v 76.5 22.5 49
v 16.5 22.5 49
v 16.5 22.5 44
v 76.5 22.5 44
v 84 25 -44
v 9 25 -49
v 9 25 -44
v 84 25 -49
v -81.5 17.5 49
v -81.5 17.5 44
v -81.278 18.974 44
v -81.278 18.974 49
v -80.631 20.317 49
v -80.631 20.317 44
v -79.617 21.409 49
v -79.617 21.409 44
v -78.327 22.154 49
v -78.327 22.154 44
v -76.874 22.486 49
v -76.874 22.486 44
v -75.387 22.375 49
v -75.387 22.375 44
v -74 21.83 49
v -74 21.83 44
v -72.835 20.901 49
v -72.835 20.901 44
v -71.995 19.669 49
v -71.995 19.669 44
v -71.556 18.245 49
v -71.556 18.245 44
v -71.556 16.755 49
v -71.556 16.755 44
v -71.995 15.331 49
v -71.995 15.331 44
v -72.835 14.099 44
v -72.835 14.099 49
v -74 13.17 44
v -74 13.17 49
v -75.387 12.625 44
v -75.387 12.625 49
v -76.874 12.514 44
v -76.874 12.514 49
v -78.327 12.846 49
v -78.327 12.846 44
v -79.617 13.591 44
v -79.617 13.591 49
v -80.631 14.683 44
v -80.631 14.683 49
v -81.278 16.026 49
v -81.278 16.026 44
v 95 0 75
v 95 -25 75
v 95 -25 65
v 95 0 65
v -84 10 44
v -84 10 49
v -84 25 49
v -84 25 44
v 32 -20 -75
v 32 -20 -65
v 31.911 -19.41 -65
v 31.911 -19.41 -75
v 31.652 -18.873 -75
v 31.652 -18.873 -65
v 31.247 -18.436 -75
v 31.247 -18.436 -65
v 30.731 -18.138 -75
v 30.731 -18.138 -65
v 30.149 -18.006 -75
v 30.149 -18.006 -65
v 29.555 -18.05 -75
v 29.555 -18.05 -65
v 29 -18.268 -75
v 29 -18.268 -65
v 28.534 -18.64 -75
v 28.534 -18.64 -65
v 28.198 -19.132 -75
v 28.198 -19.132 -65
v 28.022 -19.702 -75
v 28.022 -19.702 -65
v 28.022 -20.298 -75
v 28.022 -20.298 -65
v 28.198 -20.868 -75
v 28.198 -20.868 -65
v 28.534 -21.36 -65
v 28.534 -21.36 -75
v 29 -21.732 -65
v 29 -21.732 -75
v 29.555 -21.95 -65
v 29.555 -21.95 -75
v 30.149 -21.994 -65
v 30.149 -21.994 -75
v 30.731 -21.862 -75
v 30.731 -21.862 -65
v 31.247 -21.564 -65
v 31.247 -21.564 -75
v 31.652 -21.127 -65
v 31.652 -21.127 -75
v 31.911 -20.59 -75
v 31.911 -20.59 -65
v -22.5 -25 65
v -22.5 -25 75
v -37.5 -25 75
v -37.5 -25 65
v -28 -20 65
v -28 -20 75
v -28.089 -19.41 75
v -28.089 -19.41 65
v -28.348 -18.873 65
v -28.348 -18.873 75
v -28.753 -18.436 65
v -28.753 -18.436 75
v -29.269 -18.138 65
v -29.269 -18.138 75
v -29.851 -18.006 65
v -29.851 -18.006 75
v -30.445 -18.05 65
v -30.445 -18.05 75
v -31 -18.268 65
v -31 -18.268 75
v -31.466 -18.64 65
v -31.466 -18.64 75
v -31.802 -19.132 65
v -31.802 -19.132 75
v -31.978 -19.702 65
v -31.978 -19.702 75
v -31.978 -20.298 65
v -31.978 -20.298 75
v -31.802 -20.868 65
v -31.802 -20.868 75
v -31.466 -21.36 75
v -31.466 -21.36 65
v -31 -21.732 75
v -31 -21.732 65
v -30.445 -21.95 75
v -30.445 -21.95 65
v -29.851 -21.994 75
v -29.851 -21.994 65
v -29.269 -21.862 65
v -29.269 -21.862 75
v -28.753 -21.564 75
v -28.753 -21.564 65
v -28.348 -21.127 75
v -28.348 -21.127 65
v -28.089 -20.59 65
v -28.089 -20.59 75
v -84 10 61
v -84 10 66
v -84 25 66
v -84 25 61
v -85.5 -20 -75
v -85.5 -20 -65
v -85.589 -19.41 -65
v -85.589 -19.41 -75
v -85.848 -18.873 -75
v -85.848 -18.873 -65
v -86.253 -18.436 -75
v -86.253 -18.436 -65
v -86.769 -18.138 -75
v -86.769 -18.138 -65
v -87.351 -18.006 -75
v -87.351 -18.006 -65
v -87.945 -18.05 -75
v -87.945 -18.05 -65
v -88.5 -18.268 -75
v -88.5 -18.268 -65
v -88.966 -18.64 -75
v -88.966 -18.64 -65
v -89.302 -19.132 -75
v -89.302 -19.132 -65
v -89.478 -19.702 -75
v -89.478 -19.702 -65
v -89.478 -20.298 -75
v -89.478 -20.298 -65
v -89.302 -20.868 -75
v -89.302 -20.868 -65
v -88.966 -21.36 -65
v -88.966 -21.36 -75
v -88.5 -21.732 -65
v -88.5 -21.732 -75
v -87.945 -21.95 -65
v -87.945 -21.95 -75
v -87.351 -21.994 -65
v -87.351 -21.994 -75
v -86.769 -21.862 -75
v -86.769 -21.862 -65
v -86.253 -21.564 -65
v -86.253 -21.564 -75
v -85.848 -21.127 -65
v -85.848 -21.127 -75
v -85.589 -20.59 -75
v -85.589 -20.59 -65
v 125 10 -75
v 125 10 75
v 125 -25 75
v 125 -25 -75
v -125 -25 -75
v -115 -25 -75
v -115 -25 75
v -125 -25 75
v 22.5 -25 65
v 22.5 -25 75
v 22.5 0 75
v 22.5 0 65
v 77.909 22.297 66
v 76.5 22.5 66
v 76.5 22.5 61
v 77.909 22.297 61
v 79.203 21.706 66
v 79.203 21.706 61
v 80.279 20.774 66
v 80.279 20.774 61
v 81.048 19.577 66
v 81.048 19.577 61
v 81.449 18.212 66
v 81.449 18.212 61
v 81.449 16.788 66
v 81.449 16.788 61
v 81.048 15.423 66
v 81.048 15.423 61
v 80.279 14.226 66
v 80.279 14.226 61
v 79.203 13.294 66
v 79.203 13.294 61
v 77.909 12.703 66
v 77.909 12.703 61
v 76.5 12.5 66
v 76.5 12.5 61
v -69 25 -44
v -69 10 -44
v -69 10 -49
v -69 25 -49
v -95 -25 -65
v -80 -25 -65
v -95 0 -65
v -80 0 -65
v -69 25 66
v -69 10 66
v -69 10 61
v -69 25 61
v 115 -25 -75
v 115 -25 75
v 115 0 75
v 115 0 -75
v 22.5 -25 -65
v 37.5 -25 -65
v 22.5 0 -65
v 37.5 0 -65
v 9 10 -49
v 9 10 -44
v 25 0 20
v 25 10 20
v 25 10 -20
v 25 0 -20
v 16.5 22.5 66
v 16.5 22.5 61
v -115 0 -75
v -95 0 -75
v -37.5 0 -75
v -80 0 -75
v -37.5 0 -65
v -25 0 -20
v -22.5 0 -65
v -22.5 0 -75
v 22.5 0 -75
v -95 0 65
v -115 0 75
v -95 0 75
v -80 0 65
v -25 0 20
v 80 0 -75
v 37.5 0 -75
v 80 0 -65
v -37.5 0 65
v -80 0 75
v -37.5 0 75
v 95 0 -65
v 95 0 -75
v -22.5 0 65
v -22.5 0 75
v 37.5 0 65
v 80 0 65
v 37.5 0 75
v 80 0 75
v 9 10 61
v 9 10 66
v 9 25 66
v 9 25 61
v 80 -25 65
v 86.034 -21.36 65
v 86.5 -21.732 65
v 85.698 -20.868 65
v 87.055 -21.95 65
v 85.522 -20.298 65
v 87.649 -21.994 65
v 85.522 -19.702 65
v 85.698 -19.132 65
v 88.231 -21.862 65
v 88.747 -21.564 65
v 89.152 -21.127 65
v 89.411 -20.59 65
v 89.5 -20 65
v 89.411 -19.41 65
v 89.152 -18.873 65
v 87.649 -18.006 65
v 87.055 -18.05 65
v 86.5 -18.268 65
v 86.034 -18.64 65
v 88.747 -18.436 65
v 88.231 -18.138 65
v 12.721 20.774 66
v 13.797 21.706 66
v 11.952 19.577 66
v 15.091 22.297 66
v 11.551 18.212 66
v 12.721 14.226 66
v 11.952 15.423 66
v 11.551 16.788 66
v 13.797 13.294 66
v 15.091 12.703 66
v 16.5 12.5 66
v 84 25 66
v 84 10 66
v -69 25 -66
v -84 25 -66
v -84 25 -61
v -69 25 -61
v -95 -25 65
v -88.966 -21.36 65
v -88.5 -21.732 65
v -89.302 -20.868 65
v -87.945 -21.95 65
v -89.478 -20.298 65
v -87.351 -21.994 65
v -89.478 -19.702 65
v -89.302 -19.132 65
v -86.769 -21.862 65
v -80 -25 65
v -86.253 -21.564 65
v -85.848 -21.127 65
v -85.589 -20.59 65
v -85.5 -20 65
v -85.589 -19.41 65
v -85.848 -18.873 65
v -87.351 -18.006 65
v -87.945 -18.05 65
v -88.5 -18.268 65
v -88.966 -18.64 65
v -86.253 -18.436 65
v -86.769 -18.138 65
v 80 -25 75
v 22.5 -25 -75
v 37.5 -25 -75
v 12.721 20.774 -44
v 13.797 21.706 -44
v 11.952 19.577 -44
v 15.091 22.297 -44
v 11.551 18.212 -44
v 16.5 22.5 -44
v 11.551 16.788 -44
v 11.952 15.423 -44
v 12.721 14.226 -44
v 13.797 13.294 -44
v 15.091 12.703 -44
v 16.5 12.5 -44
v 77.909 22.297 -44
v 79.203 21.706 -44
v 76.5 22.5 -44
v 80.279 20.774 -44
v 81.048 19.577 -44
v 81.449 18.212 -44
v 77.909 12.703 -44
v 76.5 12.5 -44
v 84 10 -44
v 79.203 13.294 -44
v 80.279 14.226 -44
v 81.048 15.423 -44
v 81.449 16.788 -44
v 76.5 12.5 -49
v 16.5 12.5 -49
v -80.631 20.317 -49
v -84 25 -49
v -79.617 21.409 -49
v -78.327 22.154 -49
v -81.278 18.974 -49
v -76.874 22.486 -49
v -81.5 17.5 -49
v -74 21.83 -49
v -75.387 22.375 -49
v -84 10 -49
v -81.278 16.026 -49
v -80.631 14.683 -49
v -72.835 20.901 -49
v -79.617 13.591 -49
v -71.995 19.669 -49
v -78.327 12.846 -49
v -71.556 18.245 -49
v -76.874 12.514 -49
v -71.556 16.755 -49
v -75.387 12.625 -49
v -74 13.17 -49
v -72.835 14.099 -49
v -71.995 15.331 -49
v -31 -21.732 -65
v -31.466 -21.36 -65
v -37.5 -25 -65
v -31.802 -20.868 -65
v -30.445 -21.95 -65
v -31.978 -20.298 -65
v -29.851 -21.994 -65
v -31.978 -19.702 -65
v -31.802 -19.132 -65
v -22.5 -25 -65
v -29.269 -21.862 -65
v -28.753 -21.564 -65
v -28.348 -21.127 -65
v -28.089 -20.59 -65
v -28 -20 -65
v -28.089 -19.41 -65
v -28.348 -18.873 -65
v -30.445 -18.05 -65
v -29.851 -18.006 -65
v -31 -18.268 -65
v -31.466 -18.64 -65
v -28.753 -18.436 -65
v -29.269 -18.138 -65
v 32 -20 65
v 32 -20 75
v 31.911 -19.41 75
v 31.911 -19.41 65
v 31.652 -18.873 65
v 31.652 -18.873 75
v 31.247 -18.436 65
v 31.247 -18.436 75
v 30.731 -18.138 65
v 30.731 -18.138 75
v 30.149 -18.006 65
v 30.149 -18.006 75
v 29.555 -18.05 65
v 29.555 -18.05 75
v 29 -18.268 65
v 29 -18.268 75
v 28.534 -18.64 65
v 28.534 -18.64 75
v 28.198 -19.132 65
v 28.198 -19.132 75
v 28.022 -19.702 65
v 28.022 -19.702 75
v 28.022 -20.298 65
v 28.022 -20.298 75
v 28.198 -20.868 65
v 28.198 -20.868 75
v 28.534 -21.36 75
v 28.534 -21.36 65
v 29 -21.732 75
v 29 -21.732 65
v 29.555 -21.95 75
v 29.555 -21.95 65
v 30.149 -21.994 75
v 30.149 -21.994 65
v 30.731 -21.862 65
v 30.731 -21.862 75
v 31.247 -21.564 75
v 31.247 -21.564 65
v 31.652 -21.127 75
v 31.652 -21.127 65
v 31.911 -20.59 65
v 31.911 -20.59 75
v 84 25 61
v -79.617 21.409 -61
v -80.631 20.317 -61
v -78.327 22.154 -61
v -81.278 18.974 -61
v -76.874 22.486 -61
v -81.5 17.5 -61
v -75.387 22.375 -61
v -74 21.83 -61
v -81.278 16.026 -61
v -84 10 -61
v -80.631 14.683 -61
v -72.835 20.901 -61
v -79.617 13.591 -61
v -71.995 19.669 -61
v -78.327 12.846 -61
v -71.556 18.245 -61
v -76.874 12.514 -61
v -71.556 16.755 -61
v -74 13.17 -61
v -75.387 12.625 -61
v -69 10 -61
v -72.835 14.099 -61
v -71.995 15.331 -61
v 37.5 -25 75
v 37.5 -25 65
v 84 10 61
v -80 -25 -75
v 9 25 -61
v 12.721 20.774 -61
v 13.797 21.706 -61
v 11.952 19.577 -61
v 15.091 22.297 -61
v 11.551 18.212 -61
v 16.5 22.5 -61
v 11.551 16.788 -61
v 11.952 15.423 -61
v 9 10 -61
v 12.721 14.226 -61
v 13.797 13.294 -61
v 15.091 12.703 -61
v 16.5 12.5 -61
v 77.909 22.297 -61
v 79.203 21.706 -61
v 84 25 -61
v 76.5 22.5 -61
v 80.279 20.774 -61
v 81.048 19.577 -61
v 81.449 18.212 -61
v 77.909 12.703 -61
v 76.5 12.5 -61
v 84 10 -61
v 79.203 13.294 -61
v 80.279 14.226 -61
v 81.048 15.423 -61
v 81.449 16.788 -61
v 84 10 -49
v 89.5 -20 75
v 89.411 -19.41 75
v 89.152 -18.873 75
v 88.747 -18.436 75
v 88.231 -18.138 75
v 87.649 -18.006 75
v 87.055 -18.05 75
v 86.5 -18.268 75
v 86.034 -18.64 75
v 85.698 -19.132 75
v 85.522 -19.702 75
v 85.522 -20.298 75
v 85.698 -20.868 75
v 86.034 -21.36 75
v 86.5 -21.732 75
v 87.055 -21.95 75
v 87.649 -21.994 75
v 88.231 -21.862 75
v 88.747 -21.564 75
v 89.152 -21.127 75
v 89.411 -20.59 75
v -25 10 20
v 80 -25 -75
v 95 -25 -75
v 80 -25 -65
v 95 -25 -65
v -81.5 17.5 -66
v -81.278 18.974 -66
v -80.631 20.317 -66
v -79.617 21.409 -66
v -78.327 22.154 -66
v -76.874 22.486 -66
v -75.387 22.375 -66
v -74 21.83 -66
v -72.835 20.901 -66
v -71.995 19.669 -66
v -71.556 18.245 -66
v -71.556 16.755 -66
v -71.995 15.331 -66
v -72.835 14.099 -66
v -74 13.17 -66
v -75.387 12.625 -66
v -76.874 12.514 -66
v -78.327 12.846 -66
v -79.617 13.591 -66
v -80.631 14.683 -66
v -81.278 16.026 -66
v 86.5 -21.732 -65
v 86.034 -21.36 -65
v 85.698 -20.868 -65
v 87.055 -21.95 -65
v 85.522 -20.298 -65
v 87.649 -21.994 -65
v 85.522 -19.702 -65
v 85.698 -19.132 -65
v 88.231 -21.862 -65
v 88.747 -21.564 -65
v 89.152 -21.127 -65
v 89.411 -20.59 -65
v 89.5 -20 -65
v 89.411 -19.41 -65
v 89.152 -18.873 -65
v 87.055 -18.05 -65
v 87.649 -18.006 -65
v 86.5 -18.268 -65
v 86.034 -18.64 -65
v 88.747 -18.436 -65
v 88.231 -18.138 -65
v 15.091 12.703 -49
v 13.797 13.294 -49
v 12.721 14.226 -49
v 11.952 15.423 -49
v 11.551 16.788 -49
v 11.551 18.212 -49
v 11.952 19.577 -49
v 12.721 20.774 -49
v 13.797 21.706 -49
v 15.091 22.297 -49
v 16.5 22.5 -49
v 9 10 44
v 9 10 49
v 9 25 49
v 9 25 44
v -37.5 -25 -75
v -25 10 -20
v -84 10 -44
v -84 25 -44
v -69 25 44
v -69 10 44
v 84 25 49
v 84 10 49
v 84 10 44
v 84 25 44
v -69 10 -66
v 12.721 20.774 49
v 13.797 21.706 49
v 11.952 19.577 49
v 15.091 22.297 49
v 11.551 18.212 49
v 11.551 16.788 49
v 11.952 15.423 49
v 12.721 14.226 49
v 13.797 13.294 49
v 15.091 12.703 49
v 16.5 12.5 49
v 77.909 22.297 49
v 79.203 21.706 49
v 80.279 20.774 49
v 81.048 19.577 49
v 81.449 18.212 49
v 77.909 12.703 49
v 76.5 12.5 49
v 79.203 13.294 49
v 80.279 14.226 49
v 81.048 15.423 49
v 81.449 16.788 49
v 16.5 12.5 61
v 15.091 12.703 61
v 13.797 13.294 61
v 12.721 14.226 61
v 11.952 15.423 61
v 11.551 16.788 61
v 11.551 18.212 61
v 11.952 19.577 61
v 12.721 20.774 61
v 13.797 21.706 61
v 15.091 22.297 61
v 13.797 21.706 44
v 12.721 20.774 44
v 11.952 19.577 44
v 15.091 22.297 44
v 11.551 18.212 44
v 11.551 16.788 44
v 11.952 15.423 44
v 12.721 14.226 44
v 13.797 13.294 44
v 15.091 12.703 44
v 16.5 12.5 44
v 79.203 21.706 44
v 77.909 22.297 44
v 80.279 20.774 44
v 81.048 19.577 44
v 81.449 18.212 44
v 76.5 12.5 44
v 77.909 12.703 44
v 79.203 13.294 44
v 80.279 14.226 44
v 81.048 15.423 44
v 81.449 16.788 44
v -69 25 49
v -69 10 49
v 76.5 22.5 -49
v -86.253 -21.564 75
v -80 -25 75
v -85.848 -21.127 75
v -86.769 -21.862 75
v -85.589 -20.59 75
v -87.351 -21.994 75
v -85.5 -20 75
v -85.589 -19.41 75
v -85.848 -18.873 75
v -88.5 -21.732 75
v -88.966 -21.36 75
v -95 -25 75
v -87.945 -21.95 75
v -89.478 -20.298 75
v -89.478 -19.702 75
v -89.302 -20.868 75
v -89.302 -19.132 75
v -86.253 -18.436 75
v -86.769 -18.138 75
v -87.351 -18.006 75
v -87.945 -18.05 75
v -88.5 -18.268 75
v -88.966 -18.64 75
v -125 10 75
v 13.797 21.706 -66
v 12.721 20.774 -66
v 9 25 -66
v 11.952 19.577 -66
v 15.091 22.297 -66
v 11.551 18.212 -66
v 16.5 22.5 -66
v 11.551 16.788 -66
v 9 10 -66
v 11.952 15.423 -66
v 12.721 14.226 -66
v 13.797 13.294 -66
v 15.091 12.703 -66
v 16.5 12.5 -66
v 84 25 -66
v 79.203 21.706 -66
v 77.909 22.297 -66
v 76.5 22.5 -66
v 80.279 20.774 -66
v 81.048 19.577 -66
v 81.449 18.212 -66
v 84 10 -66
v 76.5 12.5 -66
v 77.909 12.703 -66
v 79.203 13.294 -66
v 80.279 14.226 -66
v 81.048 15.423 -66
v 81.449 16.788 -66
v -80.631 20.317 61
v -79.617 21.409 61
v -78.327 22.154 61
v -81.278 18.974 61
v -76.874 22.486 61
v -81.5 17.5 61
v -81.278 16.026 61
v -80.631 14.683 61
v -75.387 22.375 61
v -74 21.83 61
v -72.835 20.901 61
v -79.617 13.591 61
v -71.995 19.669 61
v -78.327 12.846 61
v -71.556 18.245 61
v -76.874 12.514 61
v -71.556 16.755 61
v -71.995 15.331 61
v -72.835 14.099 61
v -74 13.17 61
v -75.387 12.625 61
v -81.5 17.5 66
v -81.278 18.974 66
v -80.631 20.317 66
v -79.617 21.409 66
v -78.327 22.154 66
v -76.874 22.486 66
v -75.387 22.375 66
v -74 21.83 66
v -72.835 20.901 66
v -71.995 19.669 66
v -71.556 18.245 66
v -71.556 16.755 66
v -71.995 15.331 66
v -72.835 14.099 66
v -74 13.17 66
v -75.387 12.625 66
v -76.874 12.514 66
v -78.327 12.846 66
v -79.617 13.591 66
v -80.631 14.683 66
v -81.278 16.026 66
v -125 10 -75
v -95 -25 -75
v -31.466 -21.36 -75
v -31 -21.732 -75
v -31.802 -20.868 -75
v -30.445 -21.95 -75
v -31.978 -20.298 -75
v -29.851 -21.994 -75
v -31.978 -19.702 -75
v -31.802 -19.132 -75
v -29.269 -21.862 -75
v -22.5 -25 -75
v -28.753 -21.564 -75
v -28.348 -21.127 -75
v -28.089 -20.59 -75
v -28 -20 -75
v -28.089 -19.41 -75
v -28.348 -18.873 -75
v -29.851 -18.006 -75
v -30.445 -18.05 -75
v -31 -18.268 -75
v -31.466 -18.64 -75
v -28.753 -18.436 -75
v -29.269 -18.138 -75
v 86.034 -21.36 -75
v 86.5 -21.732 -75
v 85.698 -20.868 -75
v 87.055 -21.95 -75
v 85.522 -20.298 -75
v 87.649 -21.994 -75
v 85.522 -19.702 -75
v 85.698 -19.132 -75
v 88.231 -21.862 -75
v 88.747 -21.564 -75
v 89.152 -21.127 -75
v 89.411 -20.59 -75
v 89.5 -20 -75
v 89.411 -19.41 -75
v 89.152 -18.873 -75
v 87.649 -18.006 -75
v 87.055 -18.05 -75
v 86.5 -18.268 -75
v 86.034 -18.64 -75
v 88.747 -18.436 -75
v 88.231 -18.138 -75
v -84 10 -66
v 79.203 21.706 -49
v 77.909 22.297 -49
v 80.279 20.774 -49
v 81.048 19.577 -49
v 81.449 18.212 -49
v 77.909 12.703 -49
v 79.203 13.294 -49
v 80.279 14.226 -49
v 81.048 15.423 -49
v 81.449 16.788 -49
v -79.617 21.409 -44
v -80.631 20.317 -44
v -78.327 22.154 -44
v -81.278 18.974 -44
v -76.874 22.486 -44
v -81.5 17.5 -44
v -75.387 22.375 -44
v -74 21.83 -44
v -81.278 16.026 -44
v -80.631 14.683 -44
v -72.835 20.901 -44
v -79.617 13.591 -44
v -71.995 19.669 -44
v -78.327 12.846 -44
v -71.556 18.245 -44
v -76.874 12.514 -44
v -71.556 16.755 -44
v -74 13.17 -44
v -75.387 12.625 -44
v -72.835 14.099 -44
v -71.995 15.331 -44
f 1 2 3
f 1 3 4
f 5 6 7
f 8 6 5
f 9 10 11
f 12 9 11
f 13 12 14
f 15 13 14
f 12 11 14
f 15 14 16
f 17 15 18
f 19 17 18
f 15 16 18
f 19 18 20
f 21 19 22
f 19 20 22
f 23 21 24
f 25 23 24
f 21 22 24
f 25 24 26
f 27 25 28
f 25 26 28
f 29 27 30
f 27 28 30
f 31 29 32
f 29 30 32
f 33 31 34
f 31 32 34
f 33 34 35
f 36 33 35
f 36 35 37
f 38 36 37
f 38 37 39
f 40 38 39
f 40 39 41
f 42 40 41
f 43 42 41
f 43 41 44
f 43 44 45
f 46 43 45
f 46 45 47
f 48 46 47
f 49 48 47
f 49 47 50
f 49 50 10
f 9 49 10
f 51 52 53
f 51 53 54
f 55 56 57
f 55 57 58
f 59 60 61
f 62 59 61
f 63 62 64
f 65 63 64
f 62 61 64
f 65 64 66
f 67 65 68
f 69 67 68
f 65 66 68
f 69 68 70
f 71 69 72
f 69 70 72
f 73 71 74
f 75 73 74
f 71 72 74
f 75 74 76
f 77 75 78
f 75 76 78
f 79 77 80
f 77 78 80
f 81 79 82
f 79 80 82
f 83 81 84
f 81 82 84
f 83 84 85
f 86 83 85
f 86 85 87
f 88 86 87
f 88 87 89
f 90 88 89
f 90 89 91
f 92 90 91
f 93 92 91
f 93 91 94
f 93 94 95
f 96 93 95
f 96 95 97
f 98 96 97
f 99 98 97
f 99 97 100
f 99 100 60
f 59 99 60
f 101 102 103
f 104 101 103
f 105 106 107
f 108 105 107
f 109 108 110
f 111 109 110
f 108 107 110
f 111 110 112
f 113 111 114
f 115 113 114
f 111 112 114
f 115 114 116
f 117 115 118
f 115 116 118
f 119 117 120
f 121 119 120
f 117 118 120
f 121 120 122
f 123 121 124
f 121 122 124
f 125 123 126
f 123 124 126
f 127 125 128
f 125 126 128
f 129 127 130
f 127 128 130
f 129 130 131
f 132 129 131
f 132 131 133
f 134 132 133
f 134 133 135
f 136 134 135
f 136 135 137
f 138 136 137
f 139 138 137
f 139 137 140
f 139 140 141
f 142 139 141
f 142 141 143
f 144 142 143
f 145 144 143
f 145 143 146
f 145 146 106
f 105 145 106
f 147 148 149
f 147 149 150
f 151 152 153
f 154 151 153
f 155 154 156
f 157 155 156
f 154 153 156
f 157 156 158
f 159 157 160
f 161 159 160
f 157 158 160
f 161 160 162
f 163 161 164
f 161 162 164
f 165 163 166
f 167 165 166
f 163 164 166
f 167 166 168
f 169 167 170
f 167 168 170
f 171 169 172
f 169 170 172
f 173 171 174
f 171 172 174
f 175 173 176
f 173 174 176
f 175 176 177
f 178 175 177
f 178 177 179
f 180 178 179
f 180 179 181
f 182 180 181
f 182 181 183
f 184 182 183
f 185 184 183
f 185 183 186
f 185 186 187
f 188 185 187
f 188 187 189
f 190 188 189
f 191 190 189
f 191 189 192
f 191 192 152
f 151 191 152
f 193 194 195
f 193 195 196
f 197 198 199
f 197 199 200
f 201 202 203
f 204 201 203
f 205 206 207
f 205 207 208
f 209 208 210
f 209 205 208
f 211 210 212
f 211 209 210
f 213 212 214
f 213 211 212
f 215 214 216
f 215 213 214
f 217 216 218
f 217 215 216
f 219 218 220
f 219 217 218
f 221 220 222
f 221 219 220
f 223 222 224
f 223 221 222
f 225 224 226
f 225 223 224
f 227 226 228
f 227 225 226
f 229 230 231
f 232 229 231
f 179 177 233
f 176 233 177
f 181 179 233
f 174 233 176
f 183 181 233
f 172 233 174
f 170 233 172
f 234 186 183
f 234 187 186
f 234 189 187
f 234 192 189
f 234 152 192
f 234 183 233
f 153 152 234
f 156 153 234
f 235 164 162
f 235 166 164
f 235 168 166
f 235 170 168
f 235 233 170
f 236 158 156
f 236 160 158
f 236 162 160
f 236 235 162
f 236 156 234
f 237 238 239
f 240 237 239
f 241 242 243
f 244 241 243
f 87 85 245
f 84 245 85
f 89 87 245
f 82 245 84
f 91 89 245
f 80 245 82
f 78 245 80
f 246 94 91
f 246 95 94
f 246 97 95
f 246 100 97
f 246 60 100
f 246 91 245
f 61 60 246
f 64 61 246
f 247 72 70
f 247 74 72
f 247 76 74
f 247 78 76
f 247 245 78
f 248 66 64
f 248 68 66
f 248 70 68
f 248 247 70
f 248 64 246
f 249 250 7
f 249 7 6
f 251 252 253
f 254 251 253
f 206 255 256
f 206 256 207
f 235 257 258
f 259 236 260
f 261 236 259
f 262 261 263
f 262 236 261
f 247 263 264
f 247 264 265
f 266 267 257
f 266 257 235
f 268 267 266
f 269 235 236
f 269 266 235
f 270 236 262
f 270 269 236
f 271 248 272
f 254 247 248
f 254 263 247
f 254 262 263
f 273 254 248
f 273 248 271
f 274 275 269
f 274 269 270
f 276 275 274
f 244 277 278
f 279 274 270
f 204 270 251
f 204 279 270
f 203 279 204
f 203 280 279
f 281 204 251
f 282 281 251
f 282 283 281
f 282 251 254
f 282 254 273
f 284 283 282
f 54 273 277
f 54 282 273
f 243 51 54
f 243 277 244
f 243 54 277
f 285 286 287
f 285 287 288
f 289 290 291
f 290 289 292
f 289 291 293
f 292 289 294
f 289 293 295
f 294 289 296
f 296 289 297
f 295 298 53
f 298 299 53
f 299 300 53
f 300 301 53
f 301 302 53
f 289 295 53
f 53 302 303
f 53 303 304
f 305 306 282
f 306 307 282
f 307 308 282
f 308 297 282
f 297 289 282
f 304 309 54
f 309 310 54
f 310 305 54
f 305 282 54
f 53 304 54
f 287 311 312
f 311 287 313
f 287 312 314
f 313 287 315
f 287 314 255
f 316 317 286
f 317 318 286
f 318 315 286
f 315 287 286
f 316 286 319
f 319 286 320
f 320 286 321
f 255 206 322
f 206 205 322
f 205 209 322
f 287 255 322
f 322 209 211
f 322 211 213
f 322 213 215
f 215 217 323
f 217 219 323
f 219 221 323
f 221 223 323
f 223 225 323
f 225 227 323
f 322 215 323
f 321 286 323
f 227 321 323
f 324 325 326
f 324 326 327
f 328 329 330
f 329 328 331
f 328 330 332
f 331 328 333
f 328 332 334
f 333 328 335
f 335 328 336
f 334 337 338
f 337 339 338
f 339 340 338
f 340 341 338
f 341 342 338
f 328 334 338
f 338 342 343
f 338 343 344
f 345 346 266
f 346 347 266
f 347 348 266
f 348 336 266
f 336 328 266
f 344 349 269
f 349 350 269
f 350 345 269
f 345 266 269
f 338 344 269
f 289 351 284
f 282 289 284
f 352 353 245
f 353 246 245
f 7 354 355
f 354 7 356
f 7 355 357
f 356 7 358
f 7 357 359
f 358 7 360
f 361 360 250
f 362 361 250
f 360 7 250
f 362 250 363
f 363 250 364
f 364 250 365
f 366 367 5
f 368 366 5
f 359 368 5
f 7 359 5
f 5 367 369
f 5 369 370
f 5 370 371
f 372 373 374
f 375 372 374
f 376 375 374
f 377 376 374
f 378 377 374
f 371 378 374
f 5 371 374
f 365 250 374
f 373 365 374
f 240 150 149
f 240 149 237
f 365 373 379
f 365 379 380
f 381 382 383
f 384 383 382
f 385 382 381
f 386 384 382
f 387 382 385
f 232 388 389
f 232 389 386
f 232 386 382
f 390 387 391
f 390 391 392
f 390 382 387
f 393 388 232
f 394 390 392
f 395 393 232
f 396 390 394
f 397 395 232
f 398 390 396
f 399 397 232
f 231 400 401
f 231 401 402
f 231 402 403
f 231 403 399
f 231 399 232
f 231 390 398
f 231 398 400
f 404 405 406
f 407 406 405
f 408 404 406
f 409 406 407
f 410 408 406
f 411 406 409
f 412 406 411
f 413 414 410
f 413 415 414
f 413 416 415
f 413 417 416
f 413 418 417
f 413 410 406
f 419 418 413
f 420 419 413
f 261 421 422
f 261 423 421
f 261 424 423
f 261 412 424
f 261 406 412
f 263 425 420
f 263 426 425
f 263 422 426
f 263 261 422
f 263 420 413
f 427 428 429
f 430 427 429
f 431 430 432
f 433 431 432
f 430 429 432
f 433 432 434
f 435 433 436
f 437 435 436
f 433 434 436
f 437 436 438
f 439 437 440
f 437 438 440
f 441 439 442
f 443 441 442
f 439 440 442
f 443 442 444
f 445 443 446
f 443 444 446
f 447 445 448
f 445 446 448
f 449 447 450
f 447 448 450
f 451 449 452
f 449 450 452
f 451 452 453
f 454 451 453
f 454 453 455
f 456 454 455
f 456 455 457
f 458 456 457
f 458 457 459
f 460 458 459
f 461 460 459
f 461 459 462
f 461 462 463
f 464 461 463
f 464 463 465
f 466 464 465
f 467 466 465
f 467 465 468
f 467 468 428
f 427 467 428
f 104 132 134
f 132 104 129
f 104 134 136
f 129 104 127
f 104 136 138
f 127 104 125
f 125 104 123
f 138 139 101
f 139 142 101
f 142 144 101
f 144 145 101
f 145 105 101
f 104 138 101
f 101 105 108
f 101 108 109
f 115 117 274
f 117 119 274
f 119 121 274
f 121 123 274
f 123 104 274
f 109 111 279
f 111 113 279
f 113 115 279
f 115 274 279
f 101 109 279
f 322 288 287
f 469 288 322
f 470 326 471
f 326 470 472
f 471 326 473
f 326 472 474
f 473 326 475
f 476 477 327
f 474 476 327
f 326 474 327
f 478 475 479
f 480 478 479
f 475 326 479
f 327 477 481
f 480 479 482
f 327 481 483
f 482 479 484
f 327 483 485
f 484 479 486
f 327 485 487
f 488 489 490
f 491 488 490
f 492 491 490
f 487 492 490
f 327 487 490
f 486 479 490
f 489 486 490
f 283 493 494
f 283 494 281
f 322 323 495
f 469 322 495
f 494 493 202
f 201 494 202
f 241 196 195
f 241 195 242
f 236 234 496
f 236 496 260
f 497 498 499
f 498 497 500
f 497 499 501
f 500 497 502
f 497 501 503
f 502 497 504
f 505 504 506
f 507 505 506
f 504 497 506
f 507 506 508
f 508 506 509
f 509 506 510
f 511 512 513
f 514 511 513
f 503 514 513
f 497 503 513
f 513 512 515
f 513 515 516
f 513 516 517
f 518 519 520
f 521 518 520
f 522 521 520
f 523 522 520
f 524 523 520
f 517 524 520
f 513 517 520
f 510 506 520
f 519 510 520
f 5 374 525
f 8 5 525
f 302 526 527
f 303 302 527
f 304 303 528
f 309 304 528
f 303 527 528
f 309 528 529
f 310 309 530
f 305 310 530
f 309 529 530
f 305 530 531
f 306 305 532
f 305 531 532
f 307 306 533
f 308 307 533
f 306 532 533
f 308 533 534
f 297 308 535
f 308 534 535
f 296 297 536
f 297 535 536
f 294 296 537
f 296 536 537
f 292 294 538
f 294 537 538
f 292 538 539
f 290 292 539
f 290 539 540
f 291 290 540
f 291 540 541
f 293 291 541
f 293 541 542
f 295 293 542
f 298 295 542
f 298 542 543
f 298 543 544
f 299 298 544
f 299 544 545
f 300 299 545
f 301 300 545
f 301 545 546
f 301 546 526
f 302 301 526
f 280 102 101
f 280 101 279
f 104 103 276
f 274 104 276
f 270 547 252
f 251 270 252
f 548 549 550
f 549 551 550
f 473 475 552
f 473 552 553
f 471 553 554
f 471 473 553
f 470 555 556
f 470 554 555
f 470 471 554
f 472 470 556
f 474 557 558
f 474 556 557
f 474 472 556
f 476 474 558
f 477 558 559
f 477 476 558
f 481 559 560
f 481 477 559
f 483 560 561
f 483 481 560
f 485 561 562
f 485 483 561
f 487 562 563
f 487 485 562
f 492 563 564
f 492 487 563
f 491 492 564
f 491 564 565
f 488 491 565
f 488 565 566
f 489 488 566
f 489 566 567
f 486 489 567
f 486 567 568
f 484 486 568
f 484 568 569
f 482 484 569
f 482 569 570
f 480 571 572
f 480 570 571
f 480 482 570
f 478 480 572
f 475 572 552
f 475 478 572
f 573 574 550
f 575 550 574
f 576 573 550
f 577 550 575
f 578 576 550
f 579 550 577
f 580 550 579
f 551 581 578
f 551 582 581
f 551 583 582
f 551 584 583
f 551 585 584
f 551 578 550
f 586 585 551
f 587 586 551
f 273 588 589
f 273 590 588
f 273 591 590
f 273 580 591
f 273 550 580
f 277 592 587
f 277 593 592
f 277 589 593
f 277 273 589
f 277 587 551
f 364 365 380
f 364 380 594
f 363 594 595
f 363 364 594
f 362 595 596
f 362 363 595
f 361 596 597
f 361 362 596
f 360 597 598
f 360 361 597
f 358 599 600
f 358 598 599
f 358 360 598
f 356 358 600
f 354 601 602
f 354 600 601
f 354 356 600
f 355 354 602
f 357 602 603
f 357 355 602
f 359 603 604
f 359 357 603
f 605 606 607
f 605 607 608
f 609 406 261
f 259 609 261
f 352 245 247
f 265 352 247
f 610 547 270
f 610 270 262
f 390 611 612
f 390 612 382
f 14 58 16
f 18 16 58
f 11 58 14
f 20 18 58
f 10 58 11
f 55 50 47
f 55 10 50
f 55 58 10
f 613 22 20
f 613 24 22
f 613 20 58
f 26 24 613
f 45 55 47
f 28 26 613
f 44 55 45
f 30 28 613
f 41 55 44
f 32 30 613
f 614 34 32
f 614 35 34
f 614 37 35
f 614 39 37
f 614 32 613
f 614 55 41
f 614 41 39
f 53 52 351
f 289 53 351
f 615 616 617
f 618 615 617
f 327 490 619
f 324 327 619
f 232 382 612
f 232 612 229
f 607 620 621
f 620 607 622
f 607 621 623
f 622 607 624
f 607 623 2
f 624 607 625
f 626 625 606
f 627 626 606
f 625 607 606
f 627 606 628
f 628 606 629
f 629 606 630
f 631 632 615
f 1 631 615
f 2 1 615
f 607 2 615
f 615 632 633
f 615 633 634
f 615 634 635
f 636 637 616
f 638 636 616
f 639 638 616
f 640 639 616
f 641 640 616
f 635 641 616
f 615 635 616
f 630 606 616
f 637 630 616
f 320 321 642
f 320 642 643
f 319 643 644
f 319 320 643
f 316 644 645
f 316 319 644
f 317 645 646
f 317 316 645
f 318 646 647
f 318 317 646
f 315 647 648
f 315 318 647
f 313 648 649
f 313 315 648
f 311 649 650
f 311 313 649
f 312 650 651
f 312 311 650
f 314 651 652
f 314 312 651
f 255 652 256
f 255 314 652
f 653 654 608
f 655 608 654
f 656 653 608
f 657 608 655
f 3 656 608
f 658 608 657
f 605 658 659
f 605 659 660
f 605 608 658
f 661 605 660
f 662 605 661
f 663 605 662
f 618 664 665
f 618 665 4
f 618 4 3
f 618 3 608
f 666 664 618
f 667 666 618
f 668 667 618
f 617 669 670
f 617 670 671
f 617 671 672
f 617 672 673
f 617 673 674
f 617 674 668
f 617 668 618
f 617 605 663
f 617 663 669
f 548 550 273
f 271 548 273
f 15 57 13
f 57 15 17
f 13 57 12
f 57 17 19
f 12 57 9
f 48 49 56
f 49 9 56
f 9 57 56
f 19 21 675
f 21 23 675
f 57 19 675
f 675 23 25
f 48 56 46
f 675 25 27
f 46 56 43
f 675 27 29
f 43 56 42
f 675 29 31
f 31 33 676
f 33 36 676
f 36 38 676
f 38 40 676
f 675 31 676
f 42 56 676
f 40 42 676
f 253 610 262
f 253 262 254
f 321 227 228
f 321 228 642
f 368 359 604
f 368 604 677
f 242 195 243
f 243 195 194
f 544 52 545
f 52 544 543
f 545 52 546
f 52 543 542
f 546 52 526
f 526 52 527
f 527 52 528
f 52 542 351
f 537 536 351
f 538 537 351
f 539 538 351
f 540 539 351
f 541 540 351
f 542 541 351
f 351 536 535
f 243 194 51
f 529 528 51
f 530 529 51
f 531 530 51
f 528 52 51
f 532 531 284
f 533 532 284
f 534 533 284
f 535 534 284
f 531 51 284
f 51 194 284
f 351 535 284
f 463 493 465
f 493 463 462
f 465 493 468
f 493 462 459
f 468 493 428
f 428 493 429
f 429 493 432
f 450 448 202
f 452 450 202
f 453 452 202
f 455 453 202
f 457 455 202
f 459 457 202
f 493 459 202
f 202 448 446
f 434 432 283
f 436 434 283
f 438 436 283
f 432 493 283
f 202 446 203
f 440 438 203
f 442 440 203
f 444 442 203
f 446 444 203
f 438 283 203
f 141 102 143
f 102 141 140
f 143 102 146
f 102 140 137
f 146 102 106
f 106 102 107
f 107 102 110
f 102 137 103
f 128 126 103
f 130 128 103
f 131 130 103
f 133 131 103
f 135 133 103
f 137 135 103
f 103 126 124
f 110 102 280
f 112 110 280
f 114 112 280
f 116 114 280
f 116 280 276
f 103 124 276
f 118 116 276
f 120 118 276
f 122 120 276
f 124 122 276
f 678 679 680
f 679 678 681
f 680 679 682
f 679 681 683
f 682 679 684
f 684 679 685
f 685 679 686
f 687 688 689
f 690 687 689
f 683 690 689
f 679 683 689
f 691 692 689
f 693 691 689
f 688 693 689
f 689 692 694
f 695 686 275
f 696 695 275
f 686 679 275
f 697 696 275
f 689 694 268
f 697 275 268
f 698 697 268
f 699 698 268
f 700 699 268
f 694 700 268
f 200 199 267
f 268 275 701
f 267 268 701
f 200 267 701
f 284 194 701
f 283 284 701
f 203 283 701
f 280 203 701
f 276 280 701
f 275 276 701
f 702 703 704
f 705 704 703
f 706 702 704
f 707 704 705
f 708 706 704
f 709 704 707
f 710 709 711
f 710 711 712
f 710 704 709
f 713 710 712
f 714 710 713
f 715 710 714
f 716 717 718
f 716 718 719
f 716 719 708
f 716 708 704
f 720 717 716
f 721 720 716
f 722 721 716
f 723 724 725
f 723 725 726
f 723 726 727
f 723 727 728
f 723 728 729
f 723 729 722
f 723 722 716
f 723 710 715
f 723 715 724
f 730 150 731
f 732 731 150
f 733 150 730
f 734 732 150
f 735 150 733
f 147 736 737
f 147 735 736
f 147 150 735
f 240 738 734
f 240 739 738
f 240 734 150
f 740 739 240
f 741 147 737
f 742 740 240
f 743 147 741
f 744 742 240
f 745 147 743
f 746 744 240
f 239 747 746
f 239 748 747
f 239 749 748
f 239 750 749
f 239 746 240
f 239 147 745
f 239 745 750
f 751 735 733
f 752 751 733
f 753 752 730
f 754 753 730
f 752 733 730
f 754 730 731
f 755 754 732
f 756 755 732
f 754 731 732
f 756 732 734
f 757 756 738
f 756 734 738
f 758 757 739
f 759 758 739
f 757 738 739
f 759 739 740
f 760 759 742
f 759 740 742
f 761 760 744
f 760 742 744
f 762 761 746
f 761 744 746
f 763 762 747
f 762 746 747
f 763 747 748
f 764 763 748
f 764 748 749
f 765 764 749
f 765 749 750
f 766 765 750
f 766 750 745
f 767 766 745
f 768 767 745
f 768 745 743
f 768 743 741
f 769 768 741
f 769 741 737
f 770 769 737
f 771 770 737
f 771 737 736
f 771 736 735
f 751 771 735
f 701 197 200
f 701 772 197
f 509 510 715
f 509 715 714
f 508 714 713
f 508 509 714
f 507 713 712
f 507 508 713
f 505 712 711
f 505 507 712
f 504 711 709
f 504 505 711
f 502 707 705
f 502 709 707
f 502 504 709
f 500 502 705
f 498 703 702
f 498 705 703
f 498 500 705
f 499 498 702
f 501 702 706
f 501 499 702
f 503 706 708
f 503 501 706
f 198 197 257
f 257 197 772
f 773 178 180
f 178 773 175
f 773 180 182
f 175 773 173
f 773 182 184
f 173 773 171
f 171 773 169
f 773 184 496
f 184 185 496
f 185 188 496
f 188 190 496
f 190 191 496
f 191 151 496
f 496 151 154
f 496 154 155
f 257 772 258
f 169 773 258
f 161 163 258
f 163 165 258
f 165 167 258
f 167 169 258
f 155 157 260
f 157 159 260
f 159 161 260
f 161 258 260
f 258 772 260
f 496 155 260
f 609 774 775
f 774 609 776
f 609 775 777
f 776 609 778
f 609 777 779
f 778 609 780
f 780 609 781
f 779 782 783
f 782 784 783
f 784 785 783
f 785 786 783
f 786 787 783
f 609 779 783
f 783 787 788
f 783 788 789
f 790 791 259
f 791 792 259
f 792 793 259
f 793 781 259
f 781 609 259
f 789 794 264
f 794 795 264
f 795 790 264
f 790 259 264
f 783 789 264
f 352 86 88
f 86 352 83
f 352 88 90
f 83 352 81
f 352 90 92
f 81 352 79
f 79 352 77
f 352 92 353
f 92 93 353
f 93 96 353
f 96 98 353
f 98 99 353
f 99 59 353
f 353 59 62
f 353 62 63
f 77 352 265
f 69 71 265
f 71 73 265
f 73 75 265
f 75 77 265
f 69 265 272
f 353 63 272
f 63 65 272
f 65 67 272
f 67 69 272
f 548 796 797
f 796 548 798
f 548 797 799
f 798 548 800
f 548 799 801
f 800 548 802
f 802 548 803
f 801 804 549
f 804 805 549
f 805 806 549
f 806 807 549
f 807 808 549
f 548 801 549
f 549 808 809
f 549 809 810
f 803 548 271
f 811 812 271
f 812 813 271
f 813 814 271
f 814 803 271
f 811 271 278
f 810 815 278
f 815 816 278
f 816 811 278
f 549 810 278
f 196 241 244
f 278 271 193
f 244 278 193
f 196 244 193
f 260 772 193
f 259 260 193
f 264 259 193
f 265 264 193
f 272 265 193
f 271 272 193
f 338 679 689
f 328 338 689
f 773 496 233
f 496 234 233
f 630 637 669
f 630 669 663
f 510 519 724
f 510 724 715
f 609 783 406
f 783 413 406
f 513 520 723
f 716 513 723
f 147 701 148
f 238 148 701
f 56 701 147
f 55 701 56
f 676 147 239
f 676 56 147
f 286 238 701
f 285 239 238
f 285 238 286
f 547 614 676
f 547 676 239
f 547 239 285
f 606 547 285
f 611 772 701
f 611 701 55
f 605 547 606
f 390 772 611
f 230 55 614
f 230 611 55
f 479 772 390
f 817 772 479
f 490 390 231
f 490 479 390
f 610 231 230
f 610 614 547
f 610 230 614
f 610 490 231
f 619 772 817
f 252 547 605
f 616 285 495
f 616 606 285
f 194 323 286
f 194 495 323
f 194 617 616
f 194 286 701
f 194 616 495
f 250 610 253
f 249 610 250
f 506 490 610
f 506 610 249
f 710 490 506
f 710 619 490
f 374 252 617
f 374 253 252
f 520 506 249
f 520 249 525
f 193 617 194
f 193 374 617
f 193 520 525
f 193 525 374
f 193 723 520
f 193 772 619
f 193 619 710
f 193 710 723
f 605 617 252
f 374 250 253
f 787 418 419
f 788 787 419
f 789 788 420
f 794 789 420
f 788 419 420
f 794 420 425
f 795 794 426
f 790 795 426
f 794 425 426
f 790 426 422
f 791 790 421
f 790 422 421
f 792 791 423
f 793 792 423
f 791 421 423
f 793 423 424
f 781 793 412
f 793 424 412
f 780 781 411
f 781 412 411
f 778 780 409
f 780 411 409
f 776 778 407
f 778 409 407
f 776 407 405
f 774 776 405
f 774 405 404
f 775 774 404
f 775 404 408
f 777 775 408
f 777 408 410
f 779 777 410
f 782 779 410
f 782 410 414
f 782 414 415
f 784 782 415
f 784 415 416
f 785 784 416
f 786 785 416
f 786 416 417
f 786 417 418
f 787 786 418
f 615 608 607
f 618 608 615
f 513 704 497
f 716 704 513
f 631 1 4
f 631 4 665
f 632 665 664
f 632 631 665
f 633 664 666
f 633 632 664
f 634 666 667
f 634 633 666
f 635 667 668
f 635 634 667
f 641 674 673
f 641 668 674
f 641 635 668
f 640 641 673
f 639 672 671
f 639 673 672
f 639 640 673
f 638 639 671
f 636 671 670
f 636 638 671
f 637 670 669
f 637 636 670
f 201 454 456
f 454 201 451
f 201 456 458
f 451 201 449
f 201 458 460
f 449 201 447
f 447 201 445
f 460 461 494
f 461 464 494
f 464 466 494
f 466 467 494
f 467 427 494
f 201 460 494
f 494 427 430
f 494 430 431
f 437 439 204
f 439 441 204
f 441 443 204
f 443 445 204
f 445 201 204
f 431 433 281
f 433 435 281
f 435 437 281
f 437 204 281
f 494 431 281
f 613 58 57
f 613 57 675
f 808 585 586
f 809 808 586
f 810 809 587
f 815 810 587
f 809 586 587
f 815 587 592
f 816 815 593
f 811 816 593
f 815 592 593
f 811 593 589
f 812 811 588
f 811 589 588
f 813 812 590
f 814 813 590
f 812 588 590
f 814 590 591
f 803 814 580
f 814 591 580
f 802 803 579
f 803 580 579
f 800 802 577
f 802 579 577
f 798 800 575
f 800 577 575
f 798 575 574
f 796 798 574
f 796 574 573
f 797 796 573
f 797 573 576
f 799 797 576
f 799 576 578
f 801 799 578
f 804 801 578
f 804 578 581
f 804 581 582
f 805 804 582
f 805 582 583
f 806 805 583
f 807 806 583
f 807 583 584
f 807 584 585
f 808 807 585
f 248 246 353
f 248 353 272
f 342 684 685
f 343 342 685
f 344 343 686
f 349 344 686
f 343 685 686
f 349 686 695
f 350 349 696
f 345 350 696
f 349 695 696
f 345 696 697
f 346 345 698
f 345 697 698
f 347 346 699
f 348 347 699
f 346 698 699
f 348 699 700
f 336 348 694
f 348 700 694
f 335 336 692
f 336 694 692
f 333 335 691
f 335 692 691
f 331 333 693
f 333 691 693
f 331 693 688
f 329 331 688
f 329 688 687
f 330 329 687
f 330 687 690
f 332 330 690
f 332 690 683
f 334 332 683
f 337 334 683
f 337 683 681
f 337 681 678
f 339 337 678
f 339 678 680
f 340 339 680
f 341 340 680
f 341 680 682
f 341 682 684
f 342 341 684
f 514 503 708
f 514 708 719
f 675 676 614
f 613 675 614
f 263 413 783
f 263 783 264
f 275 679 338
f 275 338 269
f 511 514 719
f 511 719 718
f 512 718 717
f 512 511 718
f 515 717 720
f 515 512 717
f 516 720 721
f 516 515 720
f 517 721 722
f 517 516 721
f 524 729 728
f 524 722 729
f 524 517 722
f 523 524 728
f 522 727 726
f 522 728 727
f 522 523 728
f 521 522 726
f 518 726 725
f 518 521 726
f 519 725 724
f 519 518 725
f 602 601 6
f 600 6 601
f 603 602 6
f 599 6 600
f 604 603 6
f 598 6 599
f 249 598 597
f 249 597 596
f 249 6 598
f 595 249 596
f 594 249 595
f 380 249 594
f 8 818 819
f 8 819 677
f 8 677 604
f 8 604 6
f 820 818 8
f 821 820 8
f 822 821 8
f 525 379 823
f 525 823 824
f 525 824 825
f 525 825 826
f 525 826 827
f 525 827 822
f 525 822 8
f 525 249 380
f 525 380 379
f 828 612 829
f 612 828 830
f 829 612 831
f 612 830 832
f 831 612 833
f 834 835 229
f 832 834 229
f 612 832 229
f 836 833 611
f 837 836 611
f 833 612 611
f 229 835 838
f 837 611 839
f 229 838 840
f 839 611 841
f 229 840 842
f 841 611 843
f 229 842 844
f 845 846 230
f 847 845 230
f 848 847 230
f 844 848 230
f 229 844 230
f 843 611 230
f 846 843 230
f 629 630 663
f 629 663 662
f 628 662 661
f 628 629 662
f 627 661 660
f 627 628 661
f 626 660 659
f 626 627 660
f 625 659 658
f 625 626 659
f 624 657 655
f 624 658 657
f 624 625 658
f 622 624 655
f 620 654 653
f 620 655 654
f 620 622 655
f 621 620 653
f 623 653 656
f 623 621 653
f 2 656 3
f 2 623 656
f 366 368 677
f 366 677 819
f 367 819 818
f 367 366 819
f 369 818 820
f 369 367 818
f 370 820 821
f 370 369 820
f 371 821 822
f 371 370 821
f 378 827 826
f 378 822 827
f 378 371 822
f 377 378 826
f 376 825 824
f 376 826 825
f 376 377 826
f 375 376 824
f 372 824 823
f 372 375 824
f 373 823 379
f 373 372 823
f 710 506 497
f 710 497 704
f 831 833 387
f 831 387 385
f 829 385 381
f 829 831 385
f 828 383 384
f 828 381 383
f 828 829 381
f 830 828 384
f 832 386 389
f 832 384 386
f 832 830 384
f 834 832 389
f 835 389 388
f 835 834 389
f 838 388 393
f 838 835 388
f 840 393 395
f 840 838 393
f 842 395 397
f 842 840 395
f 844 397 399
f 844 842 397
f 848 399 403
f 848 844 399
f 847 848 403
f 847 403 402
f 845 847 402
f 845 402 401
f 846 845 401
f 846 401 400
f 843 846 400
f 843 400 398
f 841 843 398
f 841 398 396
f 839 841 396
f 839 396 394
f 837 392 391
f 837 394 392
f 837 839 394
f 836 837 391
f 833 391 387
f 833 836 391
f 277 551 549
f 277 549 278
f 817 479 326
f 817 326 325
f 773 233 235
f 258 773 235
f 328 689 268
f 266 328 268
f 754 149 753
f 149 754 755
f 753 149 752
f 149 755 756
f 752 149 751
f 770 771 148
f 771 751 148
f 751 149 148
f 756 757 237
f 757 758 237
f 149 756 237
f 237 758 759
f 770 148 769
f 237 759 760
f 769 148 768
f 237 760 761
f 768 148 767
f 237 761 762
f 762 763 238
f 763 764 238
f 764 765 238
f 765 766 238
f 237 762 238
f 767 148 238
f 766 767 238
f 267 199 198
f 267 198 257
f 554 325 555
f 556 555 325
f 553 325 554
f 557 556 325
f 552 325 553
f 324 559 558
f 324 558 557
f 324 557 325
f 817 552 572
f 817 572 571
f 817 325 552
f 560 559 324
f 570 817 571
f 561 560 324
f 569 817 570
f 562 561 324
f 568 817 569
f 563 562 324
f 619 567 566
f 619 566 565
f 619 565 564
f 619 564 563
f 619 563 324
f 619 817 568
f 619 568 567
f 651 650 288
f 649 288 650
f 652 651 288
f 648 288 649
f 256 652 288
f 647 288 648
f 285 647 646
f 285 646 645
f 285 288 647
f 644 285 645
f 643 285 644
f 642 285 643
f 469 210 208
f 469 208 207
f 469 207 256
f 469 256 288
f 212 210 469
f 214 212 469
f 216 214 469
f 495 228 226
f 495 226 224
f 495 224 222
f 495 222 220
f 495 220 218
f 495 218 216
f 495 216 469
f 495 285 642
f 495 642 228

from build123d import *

# Parameters (mm, degrees)
SKETCH1_W               = 250
SKETCH1_H               = 150
SKETCH1_W_2             = 75
SKETCH1_H_2             = 5
SKETCH1_W_3             = 15
BOSS_EXTRUDE2_DEPTH     = 10
SKETCH1_8_W             = 75
SKETCH1_8_H             = 5
SKETCH1_8_W_2           = 15
BOSS_EXTRUDE3_DEPTH     = 25
SKETCH5_W               = 230
SKETCH5_H               = 130
BOSS_EXTRUDE4_DEPTH     = 25
SKETCH7_R               = 5
CUT_EXTRUDE2_DEPTH      = 120
CUT_EXTRUDE2_DEPTH_BACK = 32
CUT_EXTRUDE3_DEPTH      = 142
SKETCH9_W               = 50
SKETCH9_H               = 40
CUT_EXTRUDE4_DEPTH      = 10
SKETCH10_R              = 2
SKETCH10_W              = 42.5
SKETCH10_H              = 25
SKETCH10_W_2            = 20
SKETCH10_W_3            = 45
CUT_EXTRUDE5_DEPTH      = 1
CUT_EXTRUDE5_DEPTH_BACK = 151


with BuildPart() as part:
    # Sketch1 → Boss-Extrude2 (new body)
    with BuildSketch(Plane(origin=(0, 0, 0), x_dir=(1, 0, 0), z_dir=(0, 1, 0))):
        Rectangle(SKETCH1_W, SKETCH1_H)
        with Locations((46.5, -63.5)):
            Rectangle(SKETCH1_W_2, SKETCH1_H_2, mode=Mode.SUBTRACT)
        with Locations((-76.5, -63.5)):
            Rectangle(SKETCH1_W_3, SKETCH1_H_2, mode=Mode.SUBTRACT)
        with Locations((-76.5, -46.5)):
            Rectangle(SKETCH1_W_3, SKETCH1_H_2, mode=Mode.SUBTRACT)
        with Locations((46.5, -46.5)):
            Rectangle(SKETCH1_W_2, SKETCH1_H_2, mode=Mode.SUBTRACT)
        with Locations((46.5, 46.5)):
            Rectangle(SKETCH1_W_2, SKETCH1_H_2, mode=Mode.SUBTRACT)
        with Locations((46.5, 63.5)):
            Rectangle(SKETCH1_W_2, SKETCH1_H_2, mode=Mode.SUBTRACT)
        with Locations((-76.5, 63.5)):
            Rectangle(SKETCH1_W_3, SKETCH1_H_2, mode=Mode.SUBTRACT)
        with Locations((-76.5, 46.5)):
            Rectangle(SKETCH1_W_3, SKETCH1_H_2, mode=Mode.SUBTRACT)
    extrude(amount=BOSS_EXTRUDE2_DEPTH)

    # Sketch1<8> → Boss-Extrude3 (add)
    with BuildSketch(Plane(origin=(0, 0, 0), x_dir=(1, 0, 0), z_dir=(0, 1, 0))):
        with Locations((46.5, -63.5)):
            Rectangle(SKETCH1_8_W, SKETCH1_8_H)
        with Locations((-76.5, -63.5)):
            Rectangle(SKETCH1_8_W_2, SKETCH1_8_H)
        with Locations((-76.5, -46.5)):
            Rectangle(SKETCH1_8_W_2, SKETCH1_8_H)
        with Locations((46.5, -46.5)):
            Rectangle(SKETCH1_8_W, SKETCH1_8_H)
        with Locations((46.5, 46.5)):
            Rectangle(SKETCH1_8_W, SKETCH1_8_H)
        with Locations((46.5, 63.5)):
            Rectangle(SKETCH1_8_W, SKETCH1_8_H)
        with Locations((-76.5, 63.5)):
            Rectangle(SKETCH1_8_W_2, SKETCH1_8_H)
        with Locations((-76.5, 46.5)):
            Rectangle(SKETCH1_8_W_2, SKETCH1_8_H)
    extrude(amount=BOSS_EXTRUDE3_DEPTH)

    # Sketch5 → Boss-Extrude4 (add)
    with BuildSketch(Plane.XZ):
        Polygon((-125, 75), (-115, 75), (115, 75), (125, 75), (125, -75), (90, -75), (-90, -75), (-125, -75), align=None)
        Rectangle(SKETCH5_W, SKETCH5_H, mode=Mode.SUBTRACT)
    extrude(amount=BOSS_EXTRUDE4_DEPTH)

    # Sketch7 → Cut-Extrude2 (cut, two sides)
    with BuildSketch(Plane(origin=(0, 0, 44), x_dir=(-1, 0, 0), z_dir=(0, 0, -1))) as cut_extrude2_sk:
        with Locations((76.5, 17.5)):
            Circle(SKETCH7_R)
    extrude(amount=CUT_EXTRUDE2_DEPTH, mode=Mode.SUBTRACT)
    extrude(cut_extrude2_sk.sketch, amount=-CUT_EXTRUDE2_DEPTH_BACK, mode=Mode.SUBTRACT)

    # Sketch8 → Cut-Extrude3 (cut, through all)
    with BuildSketch(Plane.XY.offset(66)):
        with BuildLine():
            Line((16.5, 22.5), (76.5, 22.5))
            ThreePointArc((76.5, 22.5), (81.5, 17.5), (76.5, 12.5))
            Line((76.5, 12.5), (16.5, 12.5))
            ThreePointArc((16.5, 12.5), (11.5, 17.5), (16.5, 22.5))
        make_face()
    extrude(amount=-CUT_EXTRUDE3_DEPTH, mode=Mode.SUBTRACT)

    # Sketch9 → Cut-Extrude4 (cut)
    with BuildSketch(Plane(origin=(0, 10, 0), x_dir=(1, 0, 0), z_dir=(0, 1, 0))):
        Rectangle(SKETCH9_W, SKETCH9_H)
    extrude(amount=-CUT_EXTRUDE4_DEPTH, mode=Mode.SUBTRACT)

    # Sketch10 → Cut-Extrude5 (cut, two sides)
    with BuildSketch(Plane.XY.offset(75)) as cut_extrude5_sk:
        with Locations((-87.5, -20)):
            Circle(SKETCH10_R)
        with Locations((87.5, -20)):
            Circle(SKETCH10_R)
        with Locations((-30, -20)):
            Circle(SKETCH10_R)
        with Locations((30, -20)):
            Circle(SKETCH10_R)
        with Locations((-58.75, -12.5)):
            Rectangle(SKETCH10_W, SKETCH10_H)
        with Locations((-105, -12.5)):
            Rectangle(SKETCH10_W_2, SKETCH10_H)
        with Locations((0, -12.5)):
            Rectangle(SKETCH10_W_3, SKETCH10_H)
        with Locations((58.75, -12.5)):
            Rectangle(SKETCH10_W, SKETCH10_H)
        with Locations((105, -12.5)):
            Rectangle(SKETCH10_W_2, SKETCH10_H)
    extrude(amount=CUT_EXTRUDE5_DEPTH, mode=Mode.SUBTRACT)
    extrude(cut_extrude5_sk.sketch, amount=-CUT_EXTRUDE5_DEPTH_BACK, mode=Mode.SUBTRACT)


solid = part.part
